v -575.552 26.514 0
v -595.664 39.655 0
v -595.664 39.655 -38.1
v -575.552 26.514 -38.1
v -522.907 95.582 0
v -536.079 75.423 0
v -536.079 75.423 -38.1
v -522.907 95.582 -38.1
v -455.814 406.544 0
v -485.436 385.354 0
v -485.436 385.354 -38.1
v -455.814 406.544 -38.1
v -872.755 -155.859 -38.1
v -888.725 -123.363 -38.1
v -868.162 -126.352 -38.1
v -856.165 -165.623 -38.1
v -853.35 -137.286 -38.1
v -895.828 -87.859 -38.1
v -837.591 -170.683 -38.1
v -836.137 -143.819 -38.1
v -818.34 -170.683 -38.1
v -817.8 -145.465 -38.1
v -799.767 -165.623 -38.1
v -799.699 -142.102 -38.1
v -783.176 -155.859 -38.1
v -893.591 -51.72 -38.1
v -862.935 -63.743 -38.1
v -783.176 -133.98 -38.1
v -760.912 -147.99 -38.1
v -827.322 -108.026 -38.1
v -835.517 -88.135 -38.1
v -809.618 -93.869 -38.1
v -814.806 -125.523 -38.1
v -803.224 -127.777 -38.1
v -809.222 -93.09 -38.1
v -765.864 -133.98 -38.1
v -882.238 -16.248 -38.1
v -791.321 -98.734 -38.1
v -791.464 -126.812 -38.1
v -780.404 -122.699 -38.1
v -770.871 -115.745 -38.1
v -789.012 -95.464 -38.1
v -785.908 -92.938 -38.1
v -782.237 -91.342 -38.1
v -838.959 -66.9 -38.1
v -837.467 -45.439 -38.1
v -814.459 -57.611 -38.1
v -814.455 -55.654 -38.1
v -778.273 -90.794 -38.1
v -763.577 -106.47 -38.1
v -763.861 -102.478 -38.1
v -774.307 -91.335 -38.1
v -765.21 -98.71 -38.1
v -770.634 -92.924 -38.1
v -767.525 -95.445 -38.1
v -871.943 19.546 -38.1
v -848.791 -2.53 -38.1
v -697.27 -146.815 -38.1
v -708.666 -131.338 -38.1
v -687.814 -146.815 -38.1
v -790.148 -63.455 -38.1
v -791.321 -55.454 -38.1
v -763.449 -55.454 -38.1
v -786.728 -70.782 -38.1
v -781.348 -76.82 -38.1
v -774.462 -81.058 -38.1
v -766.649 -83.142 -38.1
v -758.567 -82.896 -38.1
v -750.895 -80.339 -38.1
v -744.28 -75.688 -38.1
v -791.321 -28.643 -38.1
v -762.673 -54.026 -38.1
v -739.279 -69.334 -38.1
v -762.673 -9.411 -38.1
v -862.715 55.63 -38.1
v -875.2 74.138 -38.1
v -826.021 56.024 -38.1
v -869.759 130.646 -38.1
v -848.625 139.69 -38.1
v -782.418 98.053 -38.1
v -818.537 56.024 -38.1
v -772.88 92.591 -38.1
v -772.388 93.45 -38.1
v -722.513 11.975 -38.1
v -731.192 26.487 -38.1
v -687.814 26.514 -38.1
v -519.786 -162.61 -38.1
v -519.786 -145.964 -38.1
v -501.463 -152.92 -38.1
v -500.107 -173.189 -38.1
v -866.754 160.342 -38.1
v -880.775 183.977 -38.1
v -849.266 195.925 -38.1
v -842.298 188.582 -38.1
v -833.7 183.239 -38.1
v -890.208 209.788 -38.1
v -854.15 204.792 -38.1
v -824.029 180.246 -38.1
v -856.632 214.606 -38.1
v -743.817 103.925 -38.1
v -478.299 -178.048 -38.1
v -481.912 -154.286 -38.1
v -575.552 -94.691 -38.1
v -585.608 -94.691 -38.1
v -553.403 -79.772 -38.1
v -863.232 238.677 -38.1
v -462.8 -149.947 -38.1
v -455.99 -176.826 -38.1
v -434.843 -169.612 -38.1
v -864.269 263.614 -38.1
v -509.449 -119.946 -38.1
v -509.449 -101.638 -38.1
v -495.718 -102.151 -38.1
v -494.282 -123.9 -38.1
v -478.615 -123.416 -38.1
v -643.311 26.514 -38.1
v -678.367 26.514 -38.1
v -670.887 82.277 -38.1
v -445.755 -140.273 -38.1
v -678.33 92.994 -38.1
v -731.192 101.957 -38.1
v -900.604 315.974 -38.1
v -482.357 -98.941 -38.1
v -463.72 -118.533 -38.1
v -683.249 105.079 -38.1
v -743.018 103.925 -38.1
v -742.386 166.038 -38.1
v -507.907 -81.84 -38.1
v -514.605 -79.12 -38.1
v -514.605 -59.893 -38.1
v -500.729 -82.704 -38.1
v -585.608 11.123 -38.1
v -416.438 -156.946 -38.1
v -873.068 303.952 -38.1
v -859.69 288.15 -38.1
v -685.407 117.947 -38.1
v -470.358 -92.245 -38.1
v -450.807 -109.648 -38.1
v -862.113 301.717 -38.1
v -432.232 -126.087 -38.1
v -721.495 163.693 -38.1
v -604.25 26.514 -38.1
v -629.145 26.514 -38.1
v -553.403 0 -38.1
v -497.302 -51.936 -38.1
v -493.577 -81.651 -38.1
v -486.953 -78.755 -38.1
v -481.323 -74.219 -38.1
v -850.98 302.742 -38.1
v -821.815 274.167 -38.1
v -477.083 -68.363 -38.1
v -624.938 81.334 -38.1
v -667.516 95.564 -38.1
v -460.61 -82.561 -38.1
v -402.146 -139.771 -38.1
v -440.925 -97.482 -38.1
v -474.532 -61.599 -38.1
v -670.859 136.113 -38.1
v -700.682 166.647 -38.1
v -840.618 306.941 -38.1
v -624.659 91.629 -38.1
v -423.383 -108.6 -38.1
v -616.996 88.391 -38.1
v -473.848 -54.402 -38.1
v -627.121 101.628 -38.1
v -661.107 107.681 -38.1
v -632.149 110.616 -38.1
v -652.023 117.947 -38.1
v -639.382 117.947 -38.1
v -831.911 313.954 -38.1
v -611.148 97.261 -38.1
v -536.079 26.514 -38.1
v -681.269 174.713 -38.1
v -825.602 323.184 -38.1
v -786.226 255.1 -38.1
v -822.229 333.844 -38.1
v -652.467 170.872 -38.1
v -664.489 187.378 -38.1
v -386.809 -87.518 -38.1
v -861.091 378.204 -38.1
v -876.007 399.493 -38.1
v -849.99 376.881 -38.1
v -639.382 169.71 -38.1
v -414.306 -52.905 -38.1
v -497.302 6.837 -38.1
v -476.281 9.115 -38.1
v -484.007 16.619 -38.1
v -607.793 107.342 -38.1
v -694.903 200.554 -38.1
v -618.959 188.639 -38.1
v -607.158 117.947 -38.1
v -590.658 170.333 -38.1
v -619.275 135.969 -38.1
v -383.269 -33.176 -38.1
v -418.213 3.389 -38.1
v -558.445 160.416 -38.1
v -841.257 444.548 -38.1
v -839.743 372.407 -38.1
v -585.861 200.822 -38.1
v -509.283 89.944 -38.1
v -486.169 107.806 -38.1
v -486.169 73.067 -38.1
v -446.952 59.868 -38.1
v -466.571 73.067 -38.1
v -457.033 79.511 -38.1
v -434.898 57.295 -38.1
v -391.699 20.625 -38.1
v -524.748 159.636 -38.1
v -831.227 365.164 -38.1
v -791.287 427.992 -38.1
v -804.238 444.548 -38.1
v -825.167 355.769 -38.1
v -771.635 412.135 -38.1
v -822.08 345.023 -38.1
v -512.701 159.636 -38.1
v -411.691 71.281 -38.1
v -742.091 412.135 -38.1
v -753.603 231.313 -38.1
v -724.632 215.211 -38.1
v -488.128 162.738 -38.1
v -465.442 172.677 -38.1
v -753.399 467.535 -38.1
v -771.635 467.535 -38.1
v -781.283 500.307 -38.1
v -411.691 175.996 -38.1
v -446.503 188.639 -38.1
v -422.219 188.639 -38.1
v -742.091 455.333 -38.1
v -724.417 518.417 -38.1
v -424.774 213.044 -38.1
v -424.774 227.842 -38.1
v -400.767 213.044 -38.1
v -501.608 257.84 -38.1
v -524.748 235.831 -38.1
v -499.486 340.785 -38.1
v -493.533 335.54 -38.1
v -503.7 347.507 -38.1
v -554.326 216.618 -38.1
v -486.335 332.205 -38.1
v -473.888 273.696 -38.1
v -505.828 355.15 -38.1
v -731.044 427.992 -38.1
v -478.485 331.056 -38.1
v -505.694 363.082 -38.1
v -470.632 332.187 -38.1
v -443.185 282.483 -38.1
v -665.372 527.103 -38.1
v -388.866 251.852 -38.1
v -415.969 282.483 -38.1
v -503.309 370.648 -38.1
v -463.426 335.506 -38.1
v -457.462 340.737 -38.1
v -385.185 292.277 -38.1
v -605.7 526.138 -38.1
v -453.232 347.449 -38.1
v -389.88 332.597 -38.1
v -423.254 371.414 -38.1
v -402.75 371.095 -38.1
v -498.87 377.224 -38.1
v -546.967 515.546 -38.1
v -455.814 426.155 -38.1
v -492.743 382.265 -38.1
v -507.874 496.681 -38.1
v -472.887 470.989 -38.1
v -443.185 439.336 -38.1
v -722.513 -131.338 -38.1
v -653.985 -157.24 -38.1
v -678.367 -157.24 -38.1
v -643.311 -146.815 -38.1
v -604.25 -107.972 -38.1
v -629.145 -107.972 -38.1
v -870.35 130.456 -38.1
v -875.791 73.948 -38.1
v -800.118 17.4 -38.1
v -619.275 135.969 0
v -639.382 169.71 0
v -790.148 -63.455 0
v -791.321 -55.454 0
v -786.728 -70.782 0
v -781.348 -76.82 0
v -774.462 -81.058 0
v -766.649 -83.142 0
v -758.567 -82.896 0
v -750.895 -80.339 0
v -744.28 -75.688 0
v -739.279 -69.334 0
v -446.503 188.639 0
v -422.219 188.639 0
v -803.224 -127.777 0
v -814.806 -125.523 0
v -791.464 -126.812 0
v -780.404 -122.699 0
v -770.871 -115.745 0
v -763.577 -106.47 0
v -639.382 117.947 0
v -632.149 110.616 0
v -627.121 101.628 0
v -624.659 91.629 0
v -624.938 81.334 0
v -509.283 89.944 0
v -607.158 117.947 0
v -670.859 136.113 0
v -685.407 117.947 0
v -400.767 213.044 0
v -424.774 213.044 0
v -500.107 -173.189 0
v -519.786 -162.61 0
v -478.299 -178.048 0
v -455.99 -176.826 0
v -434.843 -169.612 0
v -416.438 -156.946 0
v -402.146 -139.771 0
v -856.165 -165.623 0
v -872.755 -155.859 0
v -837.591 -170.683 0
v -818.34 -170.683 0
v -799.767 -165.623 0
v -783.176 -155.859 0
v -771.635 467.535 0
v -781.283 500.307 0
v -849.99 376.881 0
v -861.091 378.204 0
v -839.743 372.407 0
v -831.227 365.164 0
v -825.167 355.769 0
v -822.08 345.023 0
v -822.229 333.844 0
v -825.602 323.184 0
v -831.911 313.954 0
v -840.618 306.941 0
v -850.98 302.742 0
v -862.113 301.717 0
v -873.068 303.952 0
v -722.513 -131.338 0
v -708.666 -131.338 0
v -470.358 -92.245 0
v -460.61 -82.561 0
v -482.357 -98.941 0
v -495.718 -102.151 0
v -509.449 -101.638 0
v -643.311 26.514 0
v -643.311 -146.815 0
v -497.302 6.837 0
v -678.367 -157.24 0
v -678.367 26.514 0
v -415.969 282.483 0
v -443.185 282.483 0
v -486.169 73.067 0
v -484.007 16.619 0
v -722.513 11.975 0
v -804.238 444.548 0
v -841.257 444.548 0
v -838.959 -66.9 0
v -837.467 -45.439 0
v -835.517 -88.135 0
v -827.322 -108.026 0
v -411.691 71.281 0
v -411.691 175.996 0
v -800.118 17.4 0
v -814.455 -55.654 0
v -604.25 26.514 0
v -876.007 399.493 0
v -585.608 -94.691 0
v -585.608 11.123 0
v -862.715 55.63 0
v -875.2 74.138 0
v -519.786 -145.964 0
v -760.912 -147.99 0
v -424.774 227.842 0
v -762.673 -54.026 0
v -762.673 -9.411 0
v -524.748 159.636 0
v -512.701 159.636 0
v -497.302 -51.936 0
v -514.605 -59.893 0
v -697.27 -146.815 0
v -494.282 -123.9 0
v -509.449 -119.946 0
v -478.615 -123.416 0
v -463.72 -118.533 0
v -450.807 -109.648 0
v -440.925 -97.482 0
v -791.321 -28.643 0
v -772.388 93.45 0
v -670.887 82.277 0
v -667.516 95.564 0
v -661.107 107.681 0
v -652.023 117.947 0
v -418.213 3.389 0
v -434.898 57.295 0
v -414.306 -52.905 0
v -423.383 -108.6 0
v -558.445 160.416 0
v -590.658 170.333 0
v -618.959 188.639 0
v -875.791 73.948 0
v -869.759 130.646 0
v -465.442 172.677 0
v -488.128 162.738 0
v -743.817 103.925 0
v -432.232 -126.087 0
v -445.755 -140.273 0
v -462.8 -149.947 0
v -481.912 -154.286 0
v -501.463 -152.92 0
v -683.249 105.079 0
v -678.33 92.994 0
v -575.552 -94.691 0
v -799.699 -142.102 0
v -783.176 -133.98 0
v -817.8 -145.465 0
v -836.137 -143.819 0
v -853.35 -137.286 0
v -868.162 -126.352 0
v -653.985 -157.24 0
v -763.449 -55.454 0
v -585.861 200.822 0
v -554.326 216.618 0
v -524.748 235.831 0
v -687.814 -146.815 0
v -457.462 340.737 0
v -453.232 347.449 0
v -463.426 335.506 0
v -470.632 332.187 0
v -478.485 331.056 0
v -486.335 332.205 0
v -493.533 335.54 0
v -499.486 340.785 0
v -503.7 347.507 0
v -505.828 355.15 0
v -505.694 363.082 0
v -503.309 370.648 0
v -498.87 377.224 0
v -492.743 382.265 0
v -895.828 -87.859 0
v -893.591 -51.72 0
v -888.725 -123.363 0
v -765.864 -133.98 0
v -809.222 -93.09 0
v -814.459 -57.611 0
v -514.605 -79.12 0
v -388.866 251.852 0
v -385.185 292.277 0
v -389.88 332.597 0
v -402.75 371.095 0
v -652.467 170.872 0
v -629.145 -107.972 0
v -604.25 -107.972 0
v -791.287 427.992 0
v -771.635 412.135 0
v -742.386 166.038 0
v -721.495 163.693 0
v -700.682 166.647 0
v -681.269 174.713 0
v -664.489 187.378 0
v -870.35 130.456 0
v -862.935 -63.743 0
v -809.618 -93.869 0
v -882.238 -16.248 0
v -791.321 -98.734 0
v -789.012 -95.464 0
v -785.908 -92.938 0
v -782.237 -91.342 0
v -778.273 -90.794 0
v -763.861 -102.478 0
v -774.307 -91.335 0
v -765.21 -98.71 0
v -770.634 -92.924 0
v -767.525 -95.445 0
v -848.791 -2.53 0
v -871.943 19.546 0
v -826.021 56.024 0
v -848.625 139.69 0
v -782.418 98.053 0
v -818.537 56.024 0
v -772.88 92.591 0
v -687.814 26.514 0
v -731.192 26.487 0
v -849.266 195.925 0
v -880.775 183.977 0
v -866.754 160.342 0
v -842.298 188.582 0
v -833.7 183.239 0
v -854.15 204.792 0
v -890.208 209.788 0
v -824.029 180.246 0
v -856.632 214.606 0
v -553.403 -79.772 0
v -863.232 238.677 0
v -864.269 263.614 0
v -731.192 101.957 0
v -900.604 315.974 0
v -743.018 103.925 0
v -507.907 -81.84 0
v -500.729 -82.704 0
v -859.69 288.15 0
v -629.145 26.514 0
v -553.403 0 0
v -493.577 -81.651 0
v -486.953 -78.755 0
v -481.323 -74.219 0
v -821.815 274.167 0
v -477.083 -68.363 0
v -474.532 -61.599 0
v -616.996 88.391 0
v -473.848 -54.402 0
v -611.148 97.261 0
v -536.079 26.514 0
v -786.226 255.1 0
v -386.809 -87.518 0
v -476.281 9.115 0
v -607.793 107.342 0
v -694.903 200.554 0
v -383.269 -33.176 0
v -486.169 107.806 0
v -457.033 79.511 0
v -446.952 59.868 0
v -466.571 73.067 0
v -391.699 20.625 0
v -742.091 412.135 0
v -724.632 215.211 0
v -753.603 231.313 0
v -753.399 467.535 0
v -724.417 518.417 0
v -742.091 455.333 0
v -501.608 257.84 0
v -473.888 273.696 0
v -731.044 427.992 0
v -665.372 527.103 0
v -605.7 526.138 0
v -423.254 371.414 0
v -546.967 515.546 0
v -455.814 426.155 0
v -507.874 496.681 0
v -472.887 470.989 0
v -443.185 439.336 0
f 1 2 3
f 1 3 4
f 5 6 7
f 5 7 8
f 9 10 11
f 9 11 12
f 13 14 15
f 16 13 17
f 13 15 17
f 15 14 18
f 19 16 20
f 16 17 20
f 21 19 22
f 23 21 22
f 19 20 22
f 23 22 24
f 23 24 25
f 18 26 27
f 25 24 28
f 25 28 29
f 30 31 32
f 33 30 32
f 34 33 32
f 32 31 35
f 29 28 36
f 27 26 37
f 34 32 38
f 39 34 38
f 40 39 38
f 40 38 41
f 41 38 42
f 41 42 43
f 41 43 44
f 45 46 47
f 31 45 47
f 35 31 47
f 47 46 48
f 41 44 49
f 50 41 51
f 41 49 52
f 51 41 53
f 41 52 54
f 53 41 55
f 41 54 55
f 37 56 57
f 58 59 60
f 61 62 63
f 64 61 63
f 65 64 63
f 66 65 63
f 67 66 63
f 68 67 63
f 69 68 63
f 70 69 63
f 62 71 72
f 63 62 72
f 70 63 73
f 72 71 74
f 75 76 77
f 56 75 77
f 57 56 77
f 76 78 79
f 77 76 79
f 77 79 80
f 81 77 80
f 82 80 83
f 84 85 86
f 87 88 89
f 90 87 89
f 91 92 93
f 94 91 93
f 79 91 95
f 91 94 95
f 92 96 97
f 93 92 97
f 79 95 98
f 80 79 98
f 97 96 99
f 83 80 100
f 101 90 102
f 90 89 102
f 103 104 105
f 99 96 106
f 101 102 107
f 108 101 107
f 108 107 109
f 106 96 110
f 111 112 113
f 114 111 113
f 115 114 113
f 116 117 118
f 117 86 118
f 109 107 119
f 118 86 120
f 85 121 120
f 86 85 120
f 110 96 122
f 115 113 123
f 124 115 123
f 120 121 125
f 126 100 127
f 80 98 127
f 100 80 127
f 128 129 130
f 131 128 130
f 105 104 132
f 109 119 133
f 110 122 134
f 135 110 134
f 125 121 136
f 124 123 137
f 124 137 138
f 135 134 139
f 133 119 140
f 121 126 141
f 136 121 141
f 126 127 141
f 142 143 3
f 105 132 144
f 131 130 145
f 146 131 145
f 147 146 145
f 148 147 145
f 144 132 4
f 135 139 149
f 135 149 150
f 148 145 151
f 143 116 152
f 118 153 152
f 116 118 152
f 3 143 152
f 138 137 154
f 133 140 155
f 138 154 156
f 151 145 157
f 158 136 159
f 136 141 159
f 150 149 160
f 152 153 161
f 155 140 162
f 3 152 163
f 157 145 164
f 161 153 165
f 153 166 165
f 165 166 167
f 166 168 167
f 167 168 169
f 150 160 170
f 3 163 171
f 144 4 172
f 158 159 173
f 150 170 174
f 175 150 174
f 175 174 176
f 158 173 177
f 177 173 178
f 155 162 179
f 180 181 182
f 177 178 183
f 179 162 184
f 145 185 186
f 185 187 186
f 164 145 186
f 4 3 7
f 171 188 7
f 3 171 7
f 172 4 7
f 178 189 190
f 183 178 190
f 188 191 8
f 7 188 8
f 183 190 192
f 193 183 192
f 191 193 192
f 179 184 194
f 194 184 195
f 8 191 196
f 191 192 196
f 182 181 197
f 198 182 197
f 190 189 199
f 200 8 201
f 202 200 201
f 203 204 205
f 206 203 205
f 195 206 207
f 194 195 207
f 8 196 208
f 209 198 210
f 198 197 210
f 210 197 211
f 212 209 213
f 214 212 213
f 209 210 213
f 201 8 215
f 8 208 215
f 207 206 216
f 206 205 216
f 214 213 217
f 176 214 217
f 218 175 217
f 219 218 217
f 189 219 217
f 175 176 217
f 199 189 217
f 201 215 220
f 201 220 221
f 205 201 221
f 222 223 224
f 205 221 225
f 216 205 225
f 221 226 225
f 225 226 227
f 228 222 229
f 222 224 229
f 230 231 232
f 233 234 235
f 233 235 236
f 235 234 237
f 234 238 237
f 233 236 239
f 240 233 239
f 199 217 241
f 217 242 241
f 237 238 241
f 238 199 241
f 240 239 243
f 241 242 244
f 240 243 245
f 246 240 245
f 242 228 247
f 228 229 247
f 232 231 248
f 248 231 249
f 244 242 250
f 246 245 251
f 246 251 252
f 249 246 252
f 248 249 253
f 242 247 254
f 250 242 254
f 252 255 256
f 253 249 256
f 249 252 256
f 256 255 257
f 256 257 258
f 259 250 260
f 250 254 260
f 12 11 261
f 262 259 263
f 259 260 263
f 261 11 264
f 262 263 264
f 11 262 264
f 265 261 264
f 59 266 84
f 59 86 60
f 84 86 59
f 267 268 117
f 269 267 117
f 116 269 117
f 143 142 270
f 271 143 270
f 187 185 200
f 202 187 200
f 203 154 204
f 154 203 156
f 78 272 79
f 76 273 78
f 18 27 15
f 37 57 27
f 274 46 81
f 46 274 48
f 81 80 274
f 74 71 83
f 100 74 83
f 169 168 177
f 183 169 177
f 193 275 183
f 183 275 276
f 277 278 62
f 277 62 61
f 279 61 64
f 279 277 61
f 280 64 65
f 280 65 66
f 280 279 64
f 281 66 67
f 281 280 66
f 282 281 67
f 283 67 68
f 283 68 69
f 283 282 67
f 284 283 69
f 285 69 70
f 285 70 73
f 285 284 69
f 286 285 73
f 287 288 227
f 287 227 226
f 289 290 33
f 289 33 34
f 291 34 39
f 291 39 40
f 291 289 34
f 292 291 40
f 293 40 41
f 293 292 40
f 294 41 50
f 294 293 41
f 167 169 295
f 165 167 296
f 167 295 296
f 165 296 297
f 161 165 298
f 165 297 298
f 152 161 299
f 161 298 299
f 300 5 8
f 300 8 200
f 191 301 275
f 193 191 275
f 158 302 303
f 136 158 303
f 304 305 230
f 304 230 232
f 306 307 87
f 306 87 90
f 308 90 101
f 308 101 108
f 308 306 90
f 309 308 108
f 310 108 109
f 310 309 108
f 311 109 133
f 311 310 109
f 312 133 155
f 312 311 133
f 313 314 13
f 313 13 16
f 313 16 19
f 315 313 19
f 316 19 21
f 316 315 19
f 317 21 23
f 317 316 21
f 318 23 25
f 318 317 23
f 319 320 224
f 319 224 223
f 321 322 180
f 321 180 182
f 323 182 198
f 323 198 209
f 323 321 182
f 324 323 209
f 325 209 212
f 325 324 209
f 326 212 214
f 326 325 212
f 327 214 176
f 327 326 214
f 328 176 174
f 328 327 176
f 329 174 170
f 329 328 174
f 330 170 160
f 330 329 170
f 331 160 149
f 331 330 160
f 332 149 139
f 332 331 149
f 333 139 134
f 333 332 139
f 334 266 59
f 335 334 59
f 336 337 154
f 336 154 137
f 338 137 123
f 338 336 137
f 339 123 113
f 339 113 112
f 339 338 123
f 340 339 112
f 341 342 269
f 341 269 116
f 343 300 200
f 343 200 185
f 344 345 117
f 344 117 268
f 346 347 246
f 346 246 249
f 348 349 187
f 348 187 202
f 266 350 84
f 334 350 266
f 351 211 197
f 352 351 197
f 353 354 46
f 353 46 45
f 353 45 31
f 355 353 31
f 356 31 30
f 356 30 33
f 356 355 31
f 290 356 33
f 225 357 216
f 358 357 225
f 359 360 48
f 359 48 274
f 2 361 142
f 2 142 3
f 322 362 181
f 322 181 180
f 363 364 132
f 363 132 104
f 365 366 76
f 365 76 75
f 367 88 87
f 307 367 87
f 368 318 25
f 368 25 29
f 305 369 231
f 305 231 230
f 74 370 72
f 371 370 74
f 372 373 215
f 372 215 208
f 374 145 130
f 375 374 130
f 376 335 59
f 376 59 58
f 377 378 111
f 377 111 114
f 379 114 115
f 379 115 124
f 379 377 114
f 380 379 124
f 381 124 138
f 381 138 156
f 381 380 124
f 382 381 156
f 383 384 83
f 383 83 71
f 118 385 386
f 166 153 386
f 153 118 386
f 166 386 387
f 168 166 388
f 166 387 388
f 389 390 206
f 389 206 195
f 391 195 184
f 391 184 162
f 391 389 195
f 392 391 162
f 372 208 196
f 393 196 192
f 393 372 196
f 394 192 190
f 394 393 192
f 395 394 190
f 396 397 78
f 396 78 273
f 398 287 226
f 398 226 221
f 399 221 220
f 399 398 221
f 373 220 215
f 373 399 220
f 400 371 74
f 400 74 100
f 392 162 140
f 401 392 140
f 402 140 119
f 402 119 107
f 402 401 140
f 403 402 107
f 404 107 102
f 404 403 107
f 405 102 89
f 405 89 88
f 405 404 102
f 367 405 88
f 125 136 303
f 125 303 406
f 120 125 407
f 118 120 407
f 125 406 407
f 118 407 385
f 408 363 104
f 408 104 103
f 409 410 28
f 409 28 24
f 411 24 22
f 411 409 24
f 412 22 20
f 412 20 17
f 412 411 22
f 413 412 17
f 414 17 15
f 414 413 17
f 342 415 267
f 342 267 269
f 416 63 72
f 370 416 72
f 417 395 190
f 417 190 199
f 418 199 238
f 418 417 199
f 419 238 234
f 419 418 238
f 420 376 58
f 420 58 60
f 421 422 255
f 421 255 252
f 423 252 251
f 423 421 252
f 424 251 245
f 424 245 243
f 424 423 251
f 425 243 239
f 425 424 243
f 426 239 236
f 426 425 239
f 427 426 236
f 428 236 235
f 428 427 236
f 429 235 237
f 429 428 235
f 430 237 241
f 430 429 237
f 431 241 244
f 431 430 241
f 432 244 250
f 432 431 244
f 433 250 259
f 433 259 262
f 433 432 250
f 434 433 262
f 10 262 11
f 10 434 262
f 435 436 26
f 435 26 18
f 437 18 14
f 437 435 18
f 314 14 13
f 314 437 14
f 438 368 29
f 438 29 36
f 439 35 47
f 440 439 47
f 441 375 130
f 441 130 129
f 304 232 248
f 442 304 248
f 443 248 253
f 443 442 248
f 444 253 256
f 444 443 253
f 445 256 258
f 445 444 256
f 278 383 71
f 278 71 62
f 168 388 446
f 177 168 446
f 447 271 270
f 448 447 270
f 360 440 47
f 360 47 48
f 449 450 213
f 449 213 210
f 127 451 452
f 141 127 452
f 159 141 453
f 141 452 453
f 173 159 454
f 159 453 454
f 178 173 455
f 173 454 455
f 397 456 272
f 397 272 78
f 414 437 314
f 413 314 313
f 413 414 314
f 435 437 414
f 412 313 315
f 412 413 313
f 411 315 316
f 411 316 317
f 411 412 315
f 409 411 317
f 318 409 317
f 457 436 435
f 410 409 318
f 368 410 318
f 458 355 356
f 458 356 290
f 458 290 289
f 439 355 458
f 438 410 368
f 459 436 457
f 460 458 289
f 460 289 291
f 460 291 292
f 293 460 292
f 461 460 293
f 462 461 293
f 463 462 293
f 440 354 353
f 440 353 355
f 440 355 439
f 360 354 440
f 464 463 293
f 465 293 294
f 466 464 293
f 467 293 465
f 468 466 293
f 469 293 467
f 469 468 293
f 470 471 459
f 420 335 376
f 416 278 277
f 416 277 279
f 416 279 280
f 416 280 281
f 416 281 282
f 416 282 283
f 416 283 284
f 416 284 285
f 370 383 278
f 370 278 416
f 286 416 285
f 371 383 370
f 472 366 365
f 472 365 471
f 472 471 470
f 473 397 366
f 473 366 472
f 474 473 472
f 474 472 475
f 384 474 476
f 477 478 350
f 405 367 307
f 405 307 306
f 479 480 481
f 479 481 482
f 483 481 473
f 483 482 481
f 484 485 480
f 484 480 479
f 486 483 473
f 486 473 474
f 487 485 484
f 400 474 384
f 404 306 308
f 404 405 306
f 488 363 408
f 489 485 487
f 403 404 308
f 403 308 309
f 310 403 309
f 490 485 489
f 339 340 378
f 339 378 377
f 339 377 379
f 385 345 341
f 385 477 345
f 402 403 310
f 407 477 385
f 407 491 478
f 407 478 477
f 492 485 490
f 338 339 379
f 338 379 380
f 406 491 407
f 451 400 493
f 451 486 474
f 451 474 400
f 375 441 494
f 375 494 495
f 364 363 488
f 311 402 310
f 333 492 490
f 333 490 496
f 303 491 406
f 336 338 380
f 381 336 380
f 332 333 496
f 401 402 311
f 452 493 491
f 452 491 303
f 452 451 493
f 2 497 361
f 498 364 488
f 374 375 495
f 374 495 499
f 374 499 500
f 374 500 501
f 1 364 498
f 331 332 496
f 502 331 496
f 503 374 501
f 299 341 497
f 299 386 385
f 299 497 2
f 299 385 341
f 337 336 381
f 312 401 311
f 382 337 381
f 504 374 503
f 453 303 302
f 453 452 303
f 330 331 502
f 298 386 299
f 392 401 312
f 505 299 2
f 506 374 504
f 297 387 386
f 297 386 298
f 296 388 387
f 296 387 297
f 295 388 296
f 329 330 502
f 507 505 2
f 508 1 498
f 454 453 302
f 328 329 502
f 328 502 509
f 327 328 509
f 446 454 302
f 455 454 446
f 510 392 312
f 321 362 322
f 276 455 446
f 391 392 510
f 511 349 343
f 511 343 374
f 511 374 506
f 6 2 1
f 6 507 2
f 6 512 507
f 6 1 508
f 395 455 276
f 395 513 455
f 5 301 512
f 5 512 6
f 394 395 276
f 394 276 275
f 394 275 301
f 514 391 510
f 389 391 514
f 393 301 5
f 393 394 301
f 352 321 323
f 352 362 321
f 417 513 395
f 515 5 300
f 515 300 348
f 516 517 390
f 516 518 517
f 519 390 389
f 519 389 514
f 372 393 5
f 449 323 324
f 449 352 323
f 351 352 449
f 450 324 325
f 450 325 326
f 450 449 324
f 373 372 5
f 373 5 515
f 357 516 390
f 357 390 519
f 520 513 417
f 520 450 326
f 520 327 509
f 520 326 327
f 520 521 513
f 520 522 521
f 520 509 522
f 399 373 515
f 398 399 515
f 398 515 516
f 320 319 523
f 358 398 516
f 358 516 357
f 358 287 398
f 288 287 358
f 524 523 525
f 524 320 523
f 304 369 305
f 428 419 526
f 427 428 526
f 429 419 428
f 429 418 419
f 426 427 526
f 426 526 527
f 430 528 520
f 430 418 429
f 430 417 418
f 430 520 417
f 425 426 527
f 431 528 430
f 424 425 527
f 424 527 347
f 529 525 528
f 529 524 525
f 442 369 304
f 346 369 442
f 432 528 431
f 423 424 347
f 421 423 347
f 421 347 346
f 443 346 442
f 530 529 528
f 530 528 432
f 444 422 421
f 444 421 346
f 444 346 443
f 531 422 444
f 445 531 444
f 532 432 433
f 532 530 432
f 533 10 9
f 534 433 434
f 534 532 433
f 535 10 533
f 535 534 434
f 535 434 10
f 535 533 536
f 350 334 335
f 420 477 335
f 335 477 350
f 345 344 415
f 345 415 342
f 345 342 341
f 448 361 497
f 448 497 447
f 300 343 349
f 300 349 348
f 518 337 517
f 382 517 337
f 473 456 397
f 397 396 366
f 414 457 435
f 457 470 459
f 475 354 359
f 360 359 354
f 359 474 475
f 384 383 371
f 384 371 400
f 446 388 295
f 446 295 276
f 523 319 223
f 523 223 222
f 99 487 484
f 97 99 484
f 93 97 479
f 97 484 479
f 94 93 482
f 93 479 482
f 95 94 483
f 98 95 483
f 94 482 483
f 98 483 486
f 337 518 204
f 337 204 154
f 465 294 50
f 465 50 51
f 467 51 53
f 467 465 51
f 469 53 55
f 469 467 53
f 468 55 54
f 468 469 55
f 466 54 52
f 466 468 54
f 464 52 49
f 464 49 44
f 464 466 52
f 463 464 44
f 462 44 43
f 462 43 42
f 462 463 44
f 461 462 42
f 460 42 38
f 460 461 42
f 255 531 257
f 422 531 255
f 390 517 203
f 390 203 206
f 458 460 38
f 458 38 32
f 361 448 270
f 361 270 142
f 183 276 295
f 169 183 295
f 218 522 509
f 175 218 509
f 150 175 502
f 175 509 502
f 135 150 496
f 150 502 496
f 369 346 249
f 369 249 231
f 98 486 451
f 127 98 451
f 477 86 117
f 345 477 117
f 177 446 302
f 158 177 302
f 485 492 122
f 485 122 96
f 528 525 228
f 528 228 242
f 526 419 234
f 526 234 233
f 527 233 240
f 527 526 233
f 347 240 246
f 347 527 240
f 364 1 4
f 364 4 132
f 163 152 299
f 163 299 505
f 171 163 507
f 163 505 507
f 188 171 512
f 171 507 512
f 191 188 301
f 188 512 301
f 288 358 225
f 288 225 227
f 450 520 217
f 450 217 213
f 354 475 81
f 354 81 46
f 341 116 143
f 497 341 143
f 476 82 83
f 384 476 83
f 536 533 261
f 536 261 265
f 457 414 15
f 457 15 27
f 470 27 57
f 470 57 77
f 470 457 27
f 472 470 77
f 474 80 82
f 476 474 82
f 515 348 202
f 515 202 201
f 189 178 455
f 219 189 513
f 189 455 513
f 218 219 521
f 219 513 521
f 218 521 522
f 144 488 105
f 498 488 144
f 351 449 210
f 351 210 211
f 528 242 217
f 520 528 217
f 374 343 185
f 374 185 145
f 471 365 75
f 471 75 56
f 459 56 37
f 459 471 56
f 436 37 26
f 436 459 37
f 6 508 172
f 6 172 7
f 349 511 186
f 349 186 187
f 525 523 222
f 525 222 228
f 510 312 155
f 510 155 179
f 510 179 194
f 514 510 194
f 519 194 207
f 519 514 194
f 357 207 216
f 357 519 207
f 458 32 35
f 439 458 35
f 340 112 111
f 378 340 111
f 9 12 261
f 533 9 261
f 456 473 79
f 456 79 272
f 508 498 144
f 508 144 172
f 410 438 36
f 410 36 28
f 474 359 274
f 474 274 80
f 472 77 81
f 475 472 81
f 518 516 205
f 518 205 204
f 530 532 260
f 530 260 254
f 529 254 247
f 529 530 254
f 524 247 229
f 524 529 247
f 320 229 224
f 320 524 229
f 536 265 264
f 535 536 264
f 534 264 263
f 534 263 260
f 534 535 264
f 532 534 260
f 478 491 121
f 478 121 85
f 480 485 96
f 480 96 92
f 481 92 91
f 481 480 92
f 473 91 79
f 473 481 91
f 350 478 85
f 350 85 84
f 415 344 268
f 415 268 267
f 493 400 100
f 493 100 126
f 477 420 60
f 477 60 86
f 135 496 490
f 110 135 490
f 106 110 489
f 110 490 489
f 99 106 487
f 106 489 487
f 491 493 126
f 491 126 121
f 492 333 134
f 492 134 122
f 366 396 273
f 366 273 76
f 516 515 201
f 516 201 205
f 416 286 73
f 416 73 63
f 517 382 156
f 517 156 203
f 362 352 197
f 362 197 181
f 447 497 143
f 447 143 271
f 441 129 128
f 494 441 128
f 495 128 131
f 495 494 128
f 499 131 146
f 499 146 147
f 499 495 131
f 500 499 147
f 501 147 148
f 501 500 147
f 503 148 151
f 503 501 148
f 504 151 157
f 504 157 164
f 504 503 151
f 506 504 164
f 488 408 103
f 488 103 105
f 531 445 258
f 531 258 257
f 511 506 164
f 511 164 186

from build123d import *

# Parameters (mm, degrees)
F1_DEPTH = 38.1
F3_DEPTH = 127


with BuildPart() as f1:
    # F0 (on Top) → F1 (new body)
    with BuildSketch(Plane.XY):
        with BuildLine():
            Line((-731.1916947365, 26.4870785177), (-722.5130796432, 11.9746224955))
            Line((-722.5130796432, 11.9746224955), (-722.5130796432, -131.3378661871))
            Line((-722.5130796432, -131.3378661871), (-708.6655497551, -131.3378661871))
            Line((-708.6655497551, -131.3378661871), (-697.2703933716, -146.8154191971))
            Line((-697.2703933716, -146.8154191971), (-687.8136396408, -146.8154191971))
            Line((-687.8136396408, -146.8154191971), (-687.8136396408, 12.0345707983))
            Line((-687.8136396408, 12.0345707983), (-687.8136396408, 26.5136063099))
            Line((-687.8136396408, 26.5136063099), (-678.3671379089, 26.5136063099))
            Line((-678.3671379089, 26.5136063099), (-678.3671379089, -157.2403013706))
            Line((-678.3671379089, -157.2403013706), (-653.984606266, -157.2403013706))
            Line((-653.984606266, -157.2403013706), (-643.3111429214, -146.8154191971))
            Line((-643.3111429214, -146.8154191971), (-643.3111429214, 26.5136063099))
            Line((-643.3111429214, 26.5136063099), (-629.1449069977, 26.5136063099))
            Line((-629.1449069977, 26.5136063099), (-629.1449069977, -107.971586287))
            Line((-629.1449069977, -107.971586287), (-618.0527210236, -107.971586287))
            Line((-618.0527210236, -107.971586287), (-604.2500734329, -107.971586287))
            Line((-604.2500734329, -107.971586287), (-604.2500734329, 26.5136063099))
            Line((-604.2500734329, 26.5136063099), (-595.6637263298, 39.6546795964))
            Line((-595.6637263298, 39.6546795964), (-575.5518201783, 26.5136063099))
            Line((-575.5518201783, 26.5136063099), (-585.6077732541, 11.1233577272))
            Line((-585.6077732541, 11.1233577272), (-585.6077732541, -94.6907624602))
            Line((-585.6077732541, -94.6907624602), (-575.5518201783, -94.6907624602))
            Line((-575.5518201783, -94.6907624602), (-553.4026026726, -79.7723308206))
            Line((-553.4026026726, -79.7723308206), (-553.4026026726, 0))
            Line((-553.4026026726, 0), (-536.0786732059, 26.5136063099))
            Line((-536.0786732059, 26.5136063099), (-536.0786732059, 75.4229649901))
            Line((-536.0786732059, 75.4229649901), (-522.9065822192, 95.5823425361))
            Line((-522.9065822192, 95.5823425361), (-509.2833638191, 89.9437069893))
            Line((-509.2833638191, 89.9437069893), (-497.3021447659, 6.8374029361))
            Line((-497.3021447659, 6.8374029361), (-497.3021447659, -51.9358835856))
            Line((-497.3021447659, -51.9358835856), (-514.6051645279, -59.8934851587))
            Line((-514.6051645279, -59.8934851587), (-514.6051645279, -79.1203603148))
            ThreePointArc((-514.6051645279, -79.1203603148), (-486.952639228, -78.7547612417), (-473.848079238, -54.4018081228))
            Line((-473.848079238, -54.4018081228), (-476.2810278798, 9.1153058296))
            Line((-476.2810278798, 9.1153058296), (-484.007271846, 16.6186105041))
            Line((-484.007271846, 16.6186105041), (-486.1694574356, 73.0668996781))
            Line((-486.1694574356, 73.0668996781), (-486.1694574356, 107.8064516187))
            Line((-486.1694574356, 107.8064516187), (-457.0328593254, 79.5105844736))
            Line((-457.0328593254, 79.5105844736), (-466.5707079503, 73.0668996781))
            Line((-466.5707079503, 73.0668996781), (-465.425214794, 43.1614515779))
            Line((-465.425214794, 43.1614515779), (-460.6095552444, -82.5612172484))
            ThreePointArc((-460.6095552444, -82.5612172484), (-482.3571557828, -98.9407724061), (-509.4490647316, -101.6382575035))
            Line((-509.4490647316, -101.6382575035), (-509.4490647316, -119.9463531375))
            ThreePointArc((-509.4490647316, -119.9463531375), (-470.9926647108, -121.5079462188), (-440.9246492968, -97.4819660187))
            Line((-440.9246492968, -97.4819660187), (-446.9517565937, 59.8680307725))
            Line((-446.9517565937, 59.8680307725), (-434.8975419998, 57.2951585054))
            ThreePointArc((-434.8975419998, 57.2951585054), (-414.6334482613, -24.645398955), (-423.3825206757, -108.5998043418))
            ThreePointArc((-423.3825206757, -108.5998043418), (-462.7997938571, -149.9474360714), (-519.7864770889, -145.9642201662))
            Line((-519.7864770889, -145.9642201662), (-519.7864770889, -162.6098304987))
            ThreePointArc((-519.7864770889, -162.6098304987), (-455.9895007094, -176.8255945828), (-402.1459817886, -139.7713422775))
            ThreePointArc((-402.1459817886, -139.7713422775), (-383.2691520577, -33.1757452244), (-411.6906225681, 71.2808296084))
            Line((-411.6906225681, 71.2808296084), (-411.6906225681, 104.6967282891))
            Line((-411.6906225681, 104.6967282891), (-411.6906225681, 128.3455342054))
            Line((-411.6906225681, 128.3455342054), (-411.6906225681, 175.9964376688))
            Line((-411.6906225681, 175.9964376688), (-422.219056836, 188.6389255524))
            Line((-422.219056836, 188.6389255524), (-446.5032815933, 188.6389255524))
            ThreePointArc((-446.5032815933, 188.6389255524), (-476.4271149395, 166.8911070934), (-512.7006173134, 159.6360098933))
            Line((-512.7006173134, 159.6360098933), (-524.7482061386, 159.6360098933))
            ThreePointArc((-524.7482061386, 159.6360098933), (-574.8934480872, 164.2635413218), (-618.9593076706, 188.6389255524))
            ThreePointArc((-618.9593076706, 188.6389255524), (-569.8726918497, 208.2799185923), (-524.7482061386, 235.830694437))
            ThreePointArc((-524.7482061386, 235.830694437), (-488.2257726665, 266.6031639409), (-443.1851804256, 282.483279705))
            Line((-443.1851804256, 282.483279705), (-415.9694612026, 282.483279705))
            Line((-415.9694612026, 282.483279705), (-424.773812294, 227.8423756361))
            Line((-424.773812294, 227.8423756361), (-424.773812294, 213.0438387394))
            Line((-424.773812294, 213.0438387394), (-400.7667005062, 213.0438387394))
            ThreePointArc((-400.7667005062, 213.0438387394), (-385.1851571559, 292.2772677462), (-402.749746719, 371.0948162924))
            Line((-402.749746719, 371.0948162924), (-423.2540428638, 371.4144825935))
            Line((-423.2540428638, 371.4144825935), (-453.2321989536, 347.4491536617))
            ThreePointArc((-453.2321989536, 347.4491536617), (-499.4858098016, 340.785048544), (-485.436052084, 385.3542208672))
            Line((-485.436052084, 385.3542208672), (-455.8143913746, 406.5436124802))
            Line((-455.8143913746, 406.5436124802), (-455.8143913746, 426.155179739))
            Line((-455.8143913746, 426.155179739), (-443.1851804256, 439.33609128))
            ThreePointArc((-443.1851804256, 439.33609128), (-489.7900132944, 484.6395194203), (-546.9671487808, 515.5456066132))
            ThreePointArc((-546.9671487808, 515.5456066132), (-665.3723554836, 527.1034219229), (-781.2833189964, 500.3074407578))
            Line((-781.2833189964, 500.3074407578), (-771.6345787048, 467.5349295139))
            Line((-771.6345787048, 467.5349295139), (-753.3994317055, 467.5349295139))
            Line((-753.3994317055, 467.5349295139), (-742.0908212662, 455.3326070309))
            Line((-742.0908212662, 455.3326070309), (-731.0435175896, 427.9921352863))
            Line((-731.0435175896, 427.9921352863), (-742.0908212662, 412.1351242065))
            Line((-742.0908212662, 412.1351242065), (-771.6345787048, 412.1351242065))
            Line((-771.6345787048, 412.1351242065), (-791.2870645523, 427.9921352863))
            Line((-791.2870645523, 427.9921352863), (-804.238140583, 444.5481002331))
            Line((-804.238140583, 444.5481002331), (-841.2569761276, 444.5481002331))
            Line((-841.2569761276, 444.5481002331), (-876.0067820549, 399.4933068752))
            Line((-876.0067820549, 399.4933068752), (-861.0913157463, 378.2041370869))
            ThreePointArc((-861.0913157463, 378.2041370869), (-822.2292208688, 333.8435879914), (-873.0680942535, 303.9516210556))
            Line((-873.0680942535, 303.9516210556), (-900.6041288376, 315.9742057323))
            Line((-900.6041288376, 315.9742057323), (-890.2077078819, 209.787979722))
            ThreePointArc((-890.2077078819, 209.787979722), (-874.3115787114, 171.8348898736), (-848.6250042915, 139.6895349026))
            Line((-848.6250042915, 139.6895349026), (-870.3500032425, 130.4563581944))
            Line((-870.3500032425, 130.4563581944), (-869.7589039803, 130.6460946798))
            Line((-869.7589039803, 130.6460946798), (-875.7906556129, 73.9481821656))
            Line((-875.7906556129, 73.9481821656), (-875.1995563507, 74.1379112005))
            Line((-875.1995563507, 74.1379112005), (-862.7149177225, 55.6296244927))
            ThreePointArc((-862.7149177225, 55.6296244927), (-876.9572464178, 1.6110286224), (-893.5905694962, -51.7198741436))
            ThreePointArc((-893.5905694962, -51.7198741436), (-893.4287937553, -105.8414051941), (-872.7551102638, -155.8590531349))
            ThreePointArc((-872.7551102638, -155.8590531349), (-827.9657363892, -171.324296948), (-783.1763625145, -155.8590531349))
            Line((-783.1763625145, -155.8590531349), (-760.9121203423, -147.9903161526))
            Line((-760.9121203423, -147.9903161526), (-765.8636419713, -133.9802053917))
            Line((-765.8636419713, -133.9802053917), (-783.1763625145, -133.9802053917))
            ThreePointArc((-783.1763625145, -133.9802053917), (-827.0247173917, -145.269269111), (-868.1616783142, -126.3517737389))
            ThreePointArc((-868.1616783142, -126.3517737389), (-856.9638188857, -32.8825469526), (-826.0206580162, 56.024197489))
            Line((-826.0206580162, 56.024197489), (-818.5369372368, 56.024197489))
            Line((-818.5369372368, 56.024197489), (-837.4670147896, -45.4388856888))
            ThreePointArc((-837.4670147896, -45.4388856888), (-835.5165665415, -88.1350122498), (-814.8064613342, -125.5229115486))
            ThreePointArc((-814.8064613342, -125.5229115486), (-785.7931191237, -125.1346402811), (-763.5766267776, -106.4704433084))
            ThreePointArc((-763.5766267776, -106.4704433084), (-774.3069923685, -91.3348306482), (-791.3212180138, -98.7337252954))
            Line((-791.3212180138, -98.7337252954), (-809.6176981926, -93.8687250018))
            Line((-809.6176981926, -93.8687250018), (-809.2222213745, -93.0898562074))
            Line((-809.2222213745, -93.0898562074), (-814.4593834877, -57.6112419367))
            Line((-814.4593834877, -57.6112419367), (-814.4550919533, -55.654078722))
            Line((-814.4550919533, -55.654078722), (-800.1184463501, 17.40015205))
            Line((-800.1184463501, 17.40015205), (-782.4180722237, 98.053380847))
            Line((-782.4180722237, 98.053380847), (-772.8795728383, 92.5909208144))
            Line((-772.8795728383, 92.5909208144), (-772.3875641823, 93.4500619769))
            Line((-772.3875641823, 93.4500619769), (-791.3212180138, -28.6431722343))
            Line((-791.3212180138, -28.6431722343), (-791.3212180138, -55.4543435574))
            ThreePointArc((-791.3212180138, -55.4543435574), (-770.63155599, -82.3851642727), (-739.2786741257, -69.3341866136))
            Line((-739.2786741257, -69.3341866136), (-763.4490561163, -55.4543435574))
            Line((-763.4490561163, -55.4543435574), (-762.6730799675, -54.0263690054))
            Line((-762.6730799675, -54.0263690054), (-762.6730799675, -9.4109801576))
            Line((-762.6730799675, -9.4109801576), (-743.8173890114, 103.9249300957))
            Line((-743.8173890114, 103.9249300957), (-743.0178838831, 103.9249300957))
            Line((-743.0178838831, 103.9249300957), (-731.1916947365, 101.9574074699))
            Line((-731.1916947365, 101.9574074699), (-731.1916947365, 26.4870785177))
        make_face()
    extrude(amount=-F1_DEPTH)


with BuildPart() as f3:
    # F2 (on Top) → F3 (new body)
    with BuildSketch(Plane.XY):
        with BuildLine():
            ThreePointArc((-664.4893288612, 187.377512455), (-709.8576008155, 207.6992325151), (-753.6029815674, 231.3126623631))
            ThreePointArc((-753.6029815674, 231.3126623631), (-803.6907655479, 265.2484372978), (-859.6902489662, 288.1499826908))
            ThreePointArc((-859.6902489662, 288.1499826908), (-864.4560638647, 251.1162867025), (-856.6317558289, 214.6061807871))
            ThreePointArc((-856.6317558289, 214.6061807871), (-846.0173180018, 192.0301678032), (-824.0290880203, 180.2462637424))
            Line((-824.0290880203, 180.2462637424), (-742.3864006996, 166.0382151604))
            ThreePointArc((-742.3864006996, 166.0382151604), (-700.6818571145, 166.6473203806), (-664.4893288612, 187.377512455))
        make_face()
    extrude(amount=-F3_DEPTH)


with BuildPart() as f3b:
    # F2 (on Top) → F3, piece 2 (new body)
    with BuildSketch(Plane.XY):
        with BuildLine():
            Line((-652.023434639, 117.9473772645), (-652.4669528008, 170.8715111017))
            Line((-652.4669528008, 170.8715111017), (-670.8592772484, 136.1133605242))
            Line((-670.8592772484, 136.1133605242), (-685.4072213173, 117.9473772645))
            ThreePointArc((-685.4072213173, 117.9473772645), (-681.1231120294, 98.9007467767), (-670.8874702454, 82.276687026))
            ThreePointArc((-670.8874702454, 82.276687026), (-664.6724607915, 101.8133101312), (-652.023434639, 117.9473772645))
        make_face()
    extrude(amount=-F3_DEPTH)


with BuildPart() as f3c:
    # F2 (on Top) → F3, piece 3 (new body)
    with BuildSketch(Plane.XY):
        with BuildLine():
            Line((-619.27485466, 135.969132185), (-639.3823027611, 169.7098165751))
            Line((-639.3823027611, 169.7098165751), (-639.3823027611, 117.9473772645))
            ThreePointArc((-639.3823027611, 117.9473772645), (-627.1213180542, 101.6284990247), (-624.9378323555, 81.3339203596))
            ThreePointArc((-624.9378323555, 81.3339203596), (-611.1482840571, 97.2612962253), (-607.1584224701, 117.9473772645))
            Line((-607.1584224701, 117.9473772645), (-619.27485466, 135.969132185))
        make_face()
    extrude(amount=-F3_DEPTH)


with BuildPart() as f1_1:
    add(f1.part)

    # F4: cut F3
    add(f3.part, mode=Mode.SUBTRACT)

    # F5: cut F3c
    add(f3c.part, mode=Mode.SUBTRACT)

    # F6: cut F3b
    add(f3b.part, mode=Mode.SUBTRACT)


solid = f1_1.part
